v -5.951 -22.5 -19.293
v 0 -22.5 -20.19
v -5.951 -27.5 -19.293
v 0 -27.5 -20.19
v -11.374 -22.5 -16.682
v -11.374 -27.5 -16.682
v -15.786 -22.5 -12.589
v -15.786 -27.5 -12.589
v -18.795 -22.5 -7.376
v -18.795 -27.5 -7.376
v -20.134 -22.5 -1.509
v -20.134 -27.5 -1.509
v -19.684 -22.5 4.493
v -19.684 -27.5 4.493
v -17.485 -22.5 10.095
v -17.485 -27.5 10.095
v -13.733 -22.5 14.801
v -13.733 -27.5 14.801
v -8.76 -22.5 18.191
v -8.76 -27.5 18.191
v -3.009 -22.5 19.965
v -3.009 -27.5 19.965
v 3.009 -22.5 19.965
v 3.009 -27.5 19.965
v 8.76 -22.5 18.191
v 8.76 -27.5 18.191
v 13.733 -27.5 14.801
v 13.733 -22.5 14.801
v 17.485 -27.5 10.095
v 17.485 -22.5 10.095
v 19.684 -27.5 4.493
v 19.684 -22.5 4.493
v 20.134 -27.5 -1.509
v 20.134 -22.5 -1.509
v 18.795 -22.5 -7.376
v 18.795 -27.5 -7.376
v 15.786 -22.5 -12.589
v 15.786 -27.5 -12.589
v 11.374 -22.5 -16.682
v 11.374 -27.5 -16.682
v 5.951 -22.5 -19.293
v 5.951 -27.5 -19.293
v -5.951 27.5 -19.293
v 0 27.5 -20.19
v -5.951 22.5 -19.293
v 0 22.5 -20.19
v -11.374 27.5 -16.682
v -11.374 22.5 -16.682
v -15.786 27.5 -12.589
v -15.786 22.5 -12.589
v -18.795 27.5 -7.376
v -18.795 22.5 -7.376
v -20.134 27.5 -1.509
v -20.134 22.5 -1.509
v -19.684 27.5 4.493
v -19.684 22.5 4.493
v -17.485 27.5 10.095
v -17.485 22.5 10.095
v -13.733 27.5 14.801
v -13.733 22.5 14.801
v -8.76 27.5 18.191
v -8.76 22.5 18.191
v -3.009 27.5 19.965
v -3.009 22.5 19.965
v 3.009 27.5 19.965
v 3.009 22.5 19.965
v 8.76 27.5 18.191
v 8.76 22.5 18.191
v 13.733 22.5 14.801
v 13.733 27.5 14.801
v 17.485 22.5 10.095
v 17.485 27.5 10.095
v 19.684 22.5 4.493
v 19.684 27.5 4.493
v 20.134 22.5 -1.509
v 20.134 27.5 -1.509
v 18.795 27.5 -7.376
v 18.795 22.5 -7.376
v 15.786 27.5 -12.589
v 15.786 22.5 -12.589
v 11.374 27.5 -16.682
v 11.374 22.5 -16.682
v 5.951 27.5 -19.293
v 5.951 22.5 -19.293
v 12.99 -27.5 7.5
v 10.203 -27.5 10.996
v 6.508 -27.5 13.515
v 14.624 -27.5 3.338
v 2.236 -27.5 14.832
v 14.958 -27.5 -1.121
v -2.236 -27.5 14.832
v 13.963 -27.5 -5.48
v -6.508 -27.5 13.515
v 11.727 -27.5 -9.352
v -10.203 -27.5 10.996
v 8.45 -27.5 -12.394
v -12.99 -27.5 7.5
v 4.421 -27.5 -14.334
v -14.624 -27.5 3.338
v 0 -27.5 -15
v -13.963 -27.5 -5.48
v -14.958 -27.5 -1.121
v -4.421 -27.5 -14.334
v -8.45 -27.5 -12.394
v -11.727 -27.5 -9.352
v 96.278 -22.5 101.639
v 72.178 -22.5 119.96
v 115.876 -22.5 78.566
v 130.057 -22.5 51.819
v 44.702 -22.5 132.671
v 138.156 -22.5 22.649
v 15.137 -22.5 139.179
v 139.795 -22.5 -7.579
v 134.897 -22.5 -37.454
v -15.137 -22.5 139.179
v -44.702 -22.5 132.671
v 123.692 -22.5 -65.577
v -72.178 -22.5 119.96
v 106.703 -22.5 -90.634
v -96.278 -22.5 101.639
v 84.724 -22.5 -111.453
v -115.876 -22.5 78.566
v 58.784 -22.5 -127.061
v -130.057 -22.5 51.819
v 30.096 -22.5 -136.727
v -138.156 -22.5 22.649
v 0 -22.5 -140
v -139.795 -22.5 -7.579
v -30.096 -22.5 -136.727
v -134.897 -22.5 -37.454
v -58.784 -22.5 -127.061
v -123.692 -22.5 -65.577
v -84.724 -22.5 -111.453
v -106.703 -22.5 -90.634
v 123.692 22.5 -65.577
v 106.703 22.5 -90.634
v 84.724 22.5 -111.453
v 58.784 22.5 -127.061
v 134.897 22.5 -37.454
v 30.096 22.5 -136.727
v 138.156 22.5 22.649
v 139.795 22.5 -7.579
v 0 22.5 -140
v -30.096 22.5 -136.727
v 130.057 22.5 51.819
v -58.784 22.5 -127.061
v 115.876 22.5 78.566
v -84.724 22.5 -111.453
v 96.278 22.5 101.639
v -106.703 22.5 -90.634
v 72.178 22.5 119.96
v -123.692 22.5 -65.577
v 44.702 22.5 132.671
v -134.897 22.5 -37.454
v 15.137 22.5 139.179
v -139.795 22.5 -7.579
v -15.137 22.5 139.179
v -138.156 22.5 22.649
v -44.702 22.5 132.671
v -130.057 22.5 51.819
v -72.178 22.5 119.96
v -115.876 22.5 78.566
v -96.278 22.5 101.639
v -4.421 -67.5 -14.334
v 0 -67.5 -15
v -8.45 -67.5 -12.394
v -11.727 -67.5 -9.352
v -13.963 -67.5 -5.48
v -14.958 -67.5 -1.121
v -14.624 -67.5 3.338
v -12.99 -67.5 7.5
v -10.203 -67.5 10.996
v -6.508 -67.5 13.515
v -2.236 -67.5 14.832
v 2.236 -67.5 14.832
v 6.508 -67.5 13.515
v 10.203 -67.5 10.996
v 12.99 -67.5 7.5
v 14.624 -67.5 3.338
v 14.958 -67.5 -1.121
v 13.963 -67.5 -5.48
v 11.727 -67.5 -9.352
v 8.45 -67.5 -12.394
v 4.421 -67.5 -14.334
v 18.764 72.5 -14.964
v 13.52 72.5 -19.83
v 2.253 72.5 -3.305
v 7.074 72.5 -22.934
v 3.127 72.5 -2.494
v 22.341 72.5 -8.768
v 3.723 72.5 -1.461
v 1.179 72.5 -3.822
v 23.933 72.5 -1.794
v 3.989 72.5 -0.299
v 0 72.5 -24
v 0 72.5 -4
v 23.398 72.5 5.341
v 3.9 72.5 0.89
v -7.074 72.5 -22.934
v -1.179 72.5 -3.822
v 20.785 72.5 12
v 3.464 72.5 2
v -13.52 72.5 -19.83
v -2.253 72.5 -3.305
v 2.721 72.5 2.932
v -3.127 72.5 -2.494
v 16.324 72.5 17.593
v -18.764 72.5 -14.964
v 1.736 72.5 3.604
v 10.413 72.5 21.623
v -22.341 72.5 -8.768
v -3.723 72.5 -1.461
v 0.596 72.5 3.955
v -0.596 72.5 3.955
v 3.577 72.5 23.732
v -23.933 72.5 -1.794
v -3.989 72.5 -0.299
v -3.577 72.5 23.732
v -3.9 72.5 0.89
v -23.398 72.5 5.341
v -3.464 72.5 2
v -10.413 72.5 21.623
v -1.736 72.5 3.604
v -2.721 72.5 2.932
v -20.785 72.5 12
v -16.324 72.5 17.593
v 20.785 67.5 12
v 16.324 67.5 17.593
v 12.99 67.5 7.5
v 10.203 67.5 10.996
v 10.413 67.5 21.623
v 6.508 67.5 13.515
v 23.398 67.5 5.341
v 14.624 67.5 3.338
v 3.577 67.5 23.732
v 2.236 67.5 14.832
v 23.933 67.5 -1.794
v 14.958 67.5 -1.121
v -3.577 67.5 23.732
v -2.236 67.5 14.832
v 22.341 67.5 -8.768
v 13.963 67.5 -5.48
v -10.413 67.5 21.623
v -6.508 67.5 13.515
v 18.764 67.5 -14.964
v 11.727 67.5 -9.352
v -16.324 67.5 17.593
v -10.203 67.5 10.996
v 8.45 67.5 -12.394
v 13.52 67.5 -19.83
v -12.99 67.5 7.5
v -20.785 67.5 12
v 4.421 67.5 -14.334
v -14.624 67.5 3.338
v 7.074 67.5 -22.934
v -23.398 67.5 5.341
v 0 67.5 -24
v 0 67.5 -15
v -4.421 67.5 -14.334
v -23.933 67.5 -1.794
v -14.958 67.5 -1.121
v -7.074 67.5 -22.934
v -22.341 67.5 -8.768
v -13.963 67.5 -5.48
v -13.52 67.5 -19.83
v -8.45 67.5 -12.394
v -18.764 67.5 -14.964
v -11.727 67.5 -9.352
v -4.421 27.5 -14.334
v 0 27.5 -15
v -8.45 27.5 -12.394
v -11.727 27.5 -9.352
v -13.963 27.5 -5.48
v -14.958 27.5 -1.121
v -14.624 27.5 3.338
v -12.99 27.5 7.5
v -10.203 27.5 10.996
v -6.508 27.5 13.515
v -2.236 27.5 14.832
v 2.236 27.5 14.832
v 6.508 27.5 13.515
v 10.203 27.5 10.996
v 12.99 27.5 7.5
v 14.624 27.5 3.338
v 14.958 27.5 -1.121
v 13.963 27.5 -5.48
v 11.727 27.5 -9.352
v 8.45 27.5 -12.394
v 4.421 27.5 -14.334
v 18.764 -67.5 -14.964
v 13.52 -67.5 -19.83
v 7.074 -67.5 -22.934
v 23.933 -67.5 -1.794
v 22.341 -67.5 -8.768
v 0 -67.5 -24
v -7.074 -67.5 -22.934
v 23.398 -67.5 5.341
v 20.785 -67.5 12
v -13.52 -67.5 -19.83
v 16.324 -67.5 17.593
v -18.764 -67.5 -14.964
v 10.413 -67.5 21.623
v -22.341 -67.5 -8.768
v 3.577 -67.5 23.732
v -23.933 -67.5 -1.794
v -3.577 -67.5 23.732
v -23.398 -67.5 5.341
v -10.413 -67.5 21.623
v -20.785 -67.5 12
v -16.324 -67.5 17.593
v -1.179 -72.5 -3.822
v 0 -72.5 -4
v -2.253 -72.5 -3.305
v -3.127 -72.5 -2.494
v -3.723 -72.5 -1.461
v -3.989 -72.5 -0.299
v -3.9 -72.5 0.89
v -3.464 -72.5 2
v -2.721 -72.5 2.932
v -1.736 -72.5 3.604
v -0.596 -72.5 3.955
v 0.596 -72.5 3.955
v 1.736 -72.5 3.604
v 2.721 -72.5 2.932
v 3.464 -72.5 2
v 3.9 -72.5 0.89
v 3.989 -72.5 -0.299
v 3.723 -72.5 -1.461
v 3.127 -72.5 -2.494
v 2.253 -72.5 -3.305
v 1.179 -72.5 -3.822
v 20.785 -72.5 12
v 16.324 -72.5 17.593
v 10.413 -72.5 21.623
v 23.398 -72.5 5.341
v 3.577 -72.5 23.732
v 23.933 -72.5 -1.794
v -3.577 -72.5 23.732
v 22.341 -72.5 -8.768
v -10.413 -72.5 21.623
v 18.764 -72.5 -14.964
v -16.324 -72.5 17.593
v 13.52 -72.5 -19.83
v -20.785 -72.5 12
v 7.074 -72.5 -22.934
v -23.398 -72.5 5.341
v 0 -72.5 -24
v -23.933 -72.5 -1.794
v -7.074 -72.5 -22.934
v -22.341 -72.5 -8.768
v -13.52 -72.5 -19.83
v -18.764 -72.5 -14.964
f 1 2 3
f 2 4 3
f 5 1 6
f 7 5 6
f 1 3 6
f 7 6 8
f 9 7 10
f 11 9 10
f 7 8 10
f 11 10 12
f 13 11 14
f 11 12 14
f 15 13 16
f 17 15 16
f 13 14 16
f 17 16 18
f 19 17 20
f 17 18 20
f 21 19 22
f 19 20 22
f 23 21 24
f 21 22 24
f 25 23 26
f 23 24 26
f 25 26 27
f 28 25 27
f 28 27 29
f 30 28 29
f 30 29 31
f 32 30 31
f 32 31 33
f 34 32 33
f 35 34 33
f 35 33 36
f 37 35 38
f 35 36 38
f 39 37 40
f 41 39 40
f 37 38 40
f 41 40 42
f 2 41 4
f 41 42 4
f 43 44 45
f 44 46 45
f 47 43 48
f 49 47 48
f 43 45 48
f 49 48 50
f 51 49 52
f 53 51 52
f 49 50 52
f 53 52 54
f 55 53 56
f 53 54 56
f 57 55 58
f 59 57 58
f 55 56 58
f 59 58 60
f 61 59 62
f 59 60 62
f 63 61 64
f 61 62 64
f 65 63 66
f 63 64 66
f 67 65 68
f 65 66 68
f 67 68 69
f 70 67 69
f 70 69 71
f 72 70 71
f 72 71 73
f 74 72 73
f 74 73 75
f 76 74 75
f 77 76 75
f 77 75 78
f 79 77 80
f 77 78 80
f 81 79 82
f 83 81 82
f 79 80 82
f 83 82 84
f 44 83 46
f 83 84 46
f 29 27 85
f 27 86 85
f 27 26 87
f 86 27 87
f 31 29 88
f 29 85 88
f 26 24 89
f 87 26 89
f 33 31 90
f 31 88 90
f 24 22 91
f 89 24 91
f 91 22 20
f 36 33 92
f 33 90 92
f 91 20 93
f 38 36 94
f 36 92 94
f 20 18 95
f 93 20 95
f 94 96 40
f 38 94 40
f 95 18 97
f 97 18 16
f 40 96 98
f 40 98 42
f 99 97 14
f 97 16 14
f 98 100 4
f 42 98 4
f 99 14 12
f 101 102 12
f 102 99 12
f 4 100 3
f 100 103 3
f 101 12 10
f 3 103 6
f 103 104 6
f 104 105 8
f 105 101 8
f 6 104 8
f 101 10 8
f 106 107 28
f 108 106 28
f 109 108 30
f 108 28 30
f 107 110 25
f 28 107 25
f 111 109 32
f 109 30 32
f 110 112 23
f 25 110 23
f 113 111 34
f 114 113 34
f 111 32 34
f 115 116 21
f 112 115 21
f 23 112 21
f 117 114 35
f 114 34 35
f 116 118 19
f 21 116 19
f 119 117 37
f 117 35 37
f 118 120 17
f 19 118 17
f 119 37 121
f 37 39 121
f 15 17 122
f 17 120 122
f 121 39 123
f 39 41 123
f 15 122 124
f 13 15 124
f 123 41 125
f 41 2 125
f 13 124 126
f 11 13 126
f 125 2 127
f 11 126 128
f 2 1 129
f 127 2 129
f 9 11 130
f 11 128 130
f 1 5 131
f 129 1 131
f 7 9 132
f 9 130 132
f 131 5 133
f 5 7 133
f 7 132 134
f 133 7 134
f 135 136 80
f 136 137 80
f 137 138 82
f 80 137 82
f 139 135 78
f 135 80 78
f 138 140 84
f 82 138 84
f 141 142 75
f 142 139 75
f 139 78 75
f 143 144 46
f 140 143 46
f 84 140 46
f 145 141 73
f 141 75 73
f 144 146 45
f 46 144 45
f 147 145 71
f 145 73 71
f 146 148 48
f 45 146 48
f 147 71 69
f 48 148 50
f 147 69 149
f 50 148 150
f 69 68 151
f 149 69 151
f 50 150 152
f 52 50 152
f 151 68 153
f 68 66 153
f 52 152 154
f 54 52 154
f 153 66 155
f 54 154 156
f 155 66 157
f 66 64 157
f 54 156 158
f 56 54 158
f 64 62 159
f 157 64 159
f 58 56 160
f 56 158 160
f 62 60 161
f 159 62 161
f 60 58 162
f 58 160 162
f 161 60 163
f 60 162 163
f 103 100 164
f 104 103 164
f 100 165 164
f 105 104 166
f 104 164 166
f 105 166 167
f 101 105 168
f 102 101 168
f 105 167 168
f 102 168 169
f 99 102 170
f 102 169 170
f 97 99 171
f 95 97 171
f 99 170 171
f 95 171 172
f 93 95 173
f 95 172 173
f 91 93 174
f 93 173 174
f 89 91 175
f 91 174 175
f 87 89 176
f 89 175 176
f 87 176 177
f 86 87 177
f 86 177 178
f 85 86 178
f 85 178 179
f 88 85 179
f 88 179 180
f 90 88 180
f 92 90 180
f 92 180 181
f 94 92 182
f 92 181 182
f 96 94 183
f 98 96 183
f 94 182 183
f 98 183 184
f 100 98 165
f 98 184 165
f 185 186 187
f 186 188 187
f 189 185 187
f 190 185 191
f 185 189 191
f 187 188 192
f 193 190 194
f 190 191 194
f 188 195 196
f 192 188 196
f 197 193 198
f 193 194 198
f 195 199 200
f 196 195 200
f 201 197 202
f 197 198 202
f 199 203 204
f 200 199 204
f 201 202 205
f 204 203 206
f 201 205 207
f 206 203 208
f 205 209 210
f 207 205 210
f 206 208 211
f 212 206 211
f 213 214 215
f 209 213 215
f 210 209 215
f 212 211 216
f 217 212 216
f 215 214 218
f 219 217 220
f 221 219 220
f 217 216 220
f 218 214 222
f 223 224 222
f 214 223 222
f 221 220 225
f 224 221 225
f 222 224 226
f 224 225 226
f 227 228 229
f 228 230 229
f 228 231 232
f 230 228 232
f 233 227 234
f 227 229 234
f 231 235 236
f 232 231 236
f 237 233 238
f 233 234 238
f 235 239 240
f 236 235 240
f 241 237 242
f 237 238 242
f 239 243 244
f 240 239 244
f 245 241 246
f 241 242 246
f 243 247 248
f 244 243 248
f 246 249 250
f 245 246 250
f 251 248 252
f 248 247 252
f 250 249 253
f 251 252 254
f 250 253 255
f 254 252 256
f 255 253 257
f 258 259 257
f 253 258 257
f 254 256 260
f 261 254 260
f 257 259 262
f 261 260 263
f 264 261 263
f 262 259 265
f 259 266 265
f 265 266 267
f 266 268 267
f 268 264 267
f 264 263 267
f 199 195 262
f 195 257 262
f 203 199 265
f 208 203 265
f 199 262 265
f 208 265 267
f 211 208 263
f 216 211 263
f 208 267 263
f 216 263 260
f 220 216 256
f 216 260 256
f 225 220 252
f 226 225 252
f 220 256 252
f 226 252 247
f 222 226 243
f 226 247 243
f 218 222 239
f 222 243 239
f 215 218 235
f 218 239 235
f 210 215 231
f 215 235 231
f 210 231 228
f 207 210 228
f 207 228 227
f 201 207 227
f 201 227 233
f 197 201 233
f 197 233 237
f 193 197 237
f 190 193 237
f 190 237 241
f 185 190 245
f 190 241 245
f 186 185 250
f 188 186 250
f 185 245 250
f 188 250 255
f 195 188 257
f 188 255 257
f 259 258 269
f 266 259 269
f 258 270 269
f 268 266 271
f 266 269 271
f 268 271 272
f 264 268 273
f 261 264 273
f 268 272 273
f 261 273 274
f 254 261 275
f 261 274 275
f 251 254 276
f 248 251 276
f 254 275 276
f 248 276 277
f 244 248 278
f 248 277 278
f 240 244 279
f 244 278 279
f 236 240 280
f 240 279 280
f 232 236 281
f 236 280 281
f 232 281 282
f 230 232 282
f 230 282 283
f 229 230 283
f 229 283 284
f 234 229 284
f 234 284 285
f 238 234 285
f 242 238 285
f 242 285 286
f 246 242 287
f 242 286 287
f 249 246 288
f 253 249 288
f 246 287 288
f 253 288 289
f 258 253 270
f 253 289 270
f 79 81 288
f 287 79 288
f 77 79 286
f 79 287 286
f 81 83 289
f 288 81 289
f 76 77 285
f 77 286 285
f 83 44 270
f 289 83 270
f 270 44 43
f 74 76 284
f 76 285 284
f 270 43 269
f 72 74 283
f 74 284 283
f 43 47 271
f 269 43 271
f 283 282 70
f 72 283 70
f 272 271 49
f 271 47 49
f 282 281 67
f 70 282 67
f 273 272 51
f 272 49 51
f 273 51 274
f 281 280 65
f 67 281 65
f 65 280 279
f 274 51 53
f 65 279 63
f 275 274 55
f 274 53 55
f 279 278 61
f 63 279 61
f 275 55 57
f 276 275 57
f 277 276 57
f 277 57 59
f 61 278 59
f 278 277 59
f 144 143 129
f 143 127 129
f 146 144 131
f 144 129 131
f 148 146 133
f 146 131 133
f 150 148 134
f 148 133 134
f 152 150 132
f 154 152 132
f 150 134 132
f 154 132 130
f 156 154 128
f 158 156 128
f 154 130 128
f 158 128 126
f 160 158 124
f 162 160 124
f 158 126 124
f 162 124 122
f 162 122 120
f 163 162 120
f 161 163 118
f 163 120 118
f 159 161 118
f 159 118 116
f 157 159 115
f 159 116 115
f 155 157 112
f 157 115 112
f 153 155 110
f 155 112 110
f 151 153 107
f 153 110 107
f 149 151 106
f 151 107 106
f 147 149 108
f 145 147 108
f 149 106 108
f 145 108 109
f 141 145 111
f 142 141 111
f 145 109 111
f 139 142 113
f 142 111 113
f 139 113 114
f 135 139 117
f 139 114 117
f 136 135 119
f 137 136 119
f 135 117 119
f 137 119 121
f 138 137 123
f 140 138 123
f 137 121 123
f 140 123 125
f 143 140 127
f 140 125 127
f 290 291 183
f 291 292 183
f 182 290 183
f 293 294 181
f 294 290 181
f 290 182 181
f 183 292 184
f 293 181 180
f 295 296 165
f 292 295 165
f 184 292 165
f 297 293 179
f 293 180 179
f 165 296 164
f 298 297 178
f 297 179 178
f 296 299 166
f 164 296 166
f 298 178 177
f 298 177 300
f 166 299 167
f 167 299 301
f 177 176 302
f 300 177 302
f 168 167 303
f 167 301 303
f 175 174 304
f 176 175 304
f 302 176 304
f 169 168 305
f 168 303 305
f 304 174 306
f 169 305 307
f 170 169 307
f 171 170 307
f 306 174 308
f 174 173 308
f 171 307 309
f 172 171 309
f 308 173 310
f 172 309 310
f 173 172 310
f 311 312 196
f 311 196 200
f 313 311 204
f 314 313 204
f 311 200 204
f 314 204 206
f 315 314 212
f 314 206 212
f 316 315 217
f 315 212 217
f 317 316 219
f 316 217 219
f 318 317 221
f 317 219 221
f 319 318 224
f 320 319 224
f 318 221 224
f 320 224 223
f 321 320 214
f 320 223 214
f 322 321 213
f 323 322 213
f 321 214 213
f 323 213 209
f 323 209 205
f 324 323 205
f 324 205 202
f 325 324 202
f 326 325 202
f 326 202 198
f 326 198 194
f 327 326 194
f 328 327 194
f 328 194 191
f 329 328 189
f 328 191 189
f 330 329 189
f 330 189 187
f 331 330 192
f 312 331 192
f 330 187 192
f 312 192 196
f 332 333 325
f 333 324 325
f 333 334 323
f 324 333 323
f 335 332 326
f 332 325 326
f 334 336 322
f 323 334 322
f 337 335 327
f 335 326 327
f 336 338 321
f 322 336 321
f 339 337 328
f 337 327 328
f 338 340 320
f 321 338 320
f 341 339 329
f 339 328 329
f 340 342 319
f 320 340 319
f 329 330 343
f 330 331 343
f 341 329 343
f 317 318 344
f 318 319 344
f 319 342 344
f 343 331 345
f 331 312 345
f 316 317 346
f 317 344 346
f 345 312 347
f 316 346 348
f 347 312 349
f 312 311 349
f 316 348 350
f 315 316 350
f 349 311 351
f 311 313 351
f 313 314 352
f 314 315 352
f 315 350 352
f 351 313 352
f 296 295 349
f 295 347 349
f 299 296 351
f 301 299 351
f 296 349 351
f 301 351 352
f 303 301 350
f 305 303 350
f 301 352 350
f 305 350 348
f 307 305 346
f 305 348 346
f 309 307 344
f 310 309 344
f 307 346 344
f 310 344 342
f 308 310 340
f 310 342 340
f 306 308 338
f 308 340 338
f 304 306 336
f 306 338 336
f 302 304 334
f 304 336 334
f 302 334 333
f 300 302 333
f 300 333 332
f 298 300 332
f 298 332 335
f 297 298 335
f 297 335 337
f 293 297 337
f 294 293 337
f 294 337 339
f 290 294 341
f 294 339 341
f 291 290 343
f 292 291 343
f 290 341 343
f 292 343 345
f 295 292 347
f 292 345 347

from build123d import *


with BuildPart() as part:
    # Sketch1 → Revolve1 (revolve)
    with BuildSketch(Plane(origin=(0, 0, 0), x_dir=(0, 0, -1), z_dir=(1, 0, 0)), mode=Mode.PRIVATE) as revolve1_sk:
        Polygon((-24, 72.5), (-24, 67.5), (-15, 67.5), (-15, 27.5), (-20.190476188, 27.5), (-20.190476188, 22.5), (-140, 22.5), (-140, -22.5), (-20.190476188, -22.5), (-20.190476188, -27.5), (-15, -27.5), (-15, -67.5), (-24, -67.5), (-24, -72.5), (-4, -72.5), (-4, -32.5), (-4, 72.5), align=None)
    revolve(revolve1_sk.sketch.rotate(Axis((0, -1004.712608179, 0), (0, 1, 0)), 180), axis=Axis((0, -1004.712608179, 0), (0, 1, 0)))


solid = part.part
